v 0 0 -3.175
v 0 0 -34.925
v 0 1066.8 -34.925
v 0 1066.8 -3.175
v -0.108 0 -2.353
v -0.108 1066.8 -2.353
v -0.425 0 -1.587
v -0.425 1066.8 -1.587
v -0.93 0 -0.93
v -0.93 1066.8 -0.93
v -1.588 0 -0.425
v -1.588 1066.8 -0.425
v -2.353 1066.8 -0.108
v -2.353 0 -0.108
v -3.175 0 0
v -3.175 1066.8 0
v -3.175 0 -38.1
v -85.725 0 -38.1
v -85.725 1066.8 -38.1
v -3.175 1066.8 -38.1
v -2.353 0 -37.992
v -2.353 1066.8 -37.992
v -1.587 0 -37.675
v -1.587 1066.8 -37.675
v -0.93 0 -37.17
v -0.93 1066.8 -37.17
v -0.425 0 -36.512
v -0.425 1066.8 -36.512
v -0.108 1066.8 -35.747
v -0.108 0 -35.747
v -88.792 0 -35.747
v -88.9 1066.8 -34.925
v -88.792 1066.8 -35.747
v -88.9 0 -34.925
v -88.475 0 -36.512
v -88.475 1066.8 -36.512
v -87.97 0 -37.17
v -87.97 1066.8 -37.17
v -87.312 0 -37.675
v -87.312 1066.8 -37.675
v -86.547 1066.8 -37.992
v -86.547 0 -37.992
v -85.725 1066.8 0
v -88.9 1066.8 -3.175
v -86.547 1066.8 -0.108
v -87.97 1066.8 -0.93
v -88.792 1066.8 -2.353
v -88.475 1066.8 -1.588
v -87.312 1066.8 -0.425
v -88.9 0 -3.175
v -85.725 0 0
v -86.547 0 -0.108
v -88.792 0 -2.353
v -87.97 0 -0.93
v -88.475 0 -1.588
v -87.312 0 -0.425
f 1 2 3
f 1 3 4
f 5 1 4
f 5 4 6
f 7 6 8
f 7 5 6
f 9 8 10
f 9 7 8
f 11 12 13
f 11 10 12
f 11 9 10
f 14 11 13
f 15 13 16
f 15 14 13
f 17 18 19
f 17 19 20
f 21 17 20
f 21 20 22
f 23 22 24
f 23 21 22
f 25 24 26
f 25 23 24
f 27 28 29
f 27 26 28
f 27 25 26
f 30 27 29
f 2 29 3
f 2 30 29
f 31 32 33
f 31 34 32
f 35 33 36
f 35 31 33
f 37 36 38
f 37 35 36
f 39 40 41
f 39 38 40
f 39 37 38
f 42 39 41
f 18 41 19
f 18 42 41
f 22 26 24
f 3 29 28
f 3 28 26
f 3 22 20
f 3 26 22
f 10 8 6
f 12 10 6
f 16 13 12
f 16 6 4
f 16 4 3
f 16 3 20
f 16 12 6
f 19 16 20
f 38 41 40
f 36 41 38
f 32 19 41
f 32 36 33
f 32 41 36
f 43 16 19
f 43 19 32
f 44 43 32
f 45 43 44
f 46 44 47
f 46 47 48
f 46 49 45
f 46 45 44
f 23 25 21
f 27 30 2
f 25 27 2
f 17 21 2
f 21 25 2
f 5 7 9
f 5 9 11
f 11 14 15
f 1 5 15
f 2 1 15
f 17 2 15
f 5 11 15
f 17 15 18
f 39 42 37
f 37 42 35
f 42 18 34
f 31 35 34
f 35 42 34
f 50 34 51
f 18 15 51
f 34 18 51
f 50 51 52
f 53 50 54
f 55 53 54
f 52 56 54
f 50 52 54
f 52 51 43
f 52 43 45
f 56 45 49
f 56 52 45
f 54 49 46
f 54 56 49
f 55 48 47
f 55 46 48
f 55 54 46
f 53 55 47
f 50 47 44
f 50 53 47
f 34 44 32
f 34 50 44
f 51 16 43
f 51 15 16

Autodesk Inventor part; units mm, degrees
ref_plane "YZ Plane" through (0, 0, 0) normal (1, 0, 0) x (0, 1, 0)
ref_plane "XZ Plane" through (0, 0, 0) normal (0, 1, 0) x (-1, 0, 0)
ref_plane "XY Plane" through (0, 0, 0) normal (0, 0, 1) x (1, 0, 0)
sketch "Sketch1" plane through (0, 0, 0) normal (0, 1, 0) x (-1, 0, 0)
  line L0 (3.175, 0) -> (85.725, 0)
  line L1 (88.9, -3.175) -> (88.9, -34.925)
  line L2 (85.725, -38.1) -> (3.175, -38.1)
  line L3 (0, -34.925) -> (0, -3.175)
  arc A0 (88.9, -3.175) -> (85.725, 0) centre (85.725, -3.175) ccw
  arc A1 (85.725, -38.1) -> (88.9, -34.925) centre (85.725, -34.925) ccw
  arc A2 (0, -34.925) -> (3.175, -38.1) centre (3.175, -34.925) ccw
  arc A3 (3.175, 0) -> (0, -3.175) centre (3.175, -3.175) ccw
  point P0 (0, 0)
  point P1 (88.9, -38.1)
  point P2 (88.9, 0)
  point P3 (0, -38.1)
  dimension "d0" = 88.9
  dimension "d1" = 38.1
  dimension "d2" = 3.175
extrude "Extrusion1" add sketch "Sketch1" along normal blind 1066.8
sketch "Sketch2" plane through (-3.175, 0, -38.1) normal (0, 0, -1) x (-1, 0, 0)
  line L0 (0, 0) -> (82.55, 0) construction
  line L1 (82.55, 0) -> (82.55, 1066.8) construction
  line L2 (0, 1066.8) -> (82.55, 1066.8) construction
  line L3 (0, 0) -> (0, 1066.8) construction
  line L4 (60.325, 1066.8) -> (60.325, 800.1) construction
  line L5 (60.325, 800.1) -> (60.325, 533.4) construction
  line L6 (60.325, 533.4) -> (60.325, 266.7) construction
  line L7 (60.325, 266.7) -> (60.325, 0) construction
  circle A0 centre (60.325, 826.3001) radius 1.5875
  circle A1 centre (60.325, 773.8999) radius 1.5875
  circle A2 centre (60.325, 559.6001) radius 1.5875
  circle A3 centre (60.325, 507.1999) radius 1.5875
  circle A4 centre (60.325, 292.9001) radius 1.5875
  circle A5 centre (60.325, 240.4999) radius 1.5875
  line L8 (85.725, 0) -> (85.725, 1066.8) projected
  line L9 (60.325, 800.1) -> (22.225, 800.1) construction
  circle A6 centre (22.225, 800.1) radius 1.5875
  line L10 (60.325, 533.4) -> (22.225, 533.4) construction
  circle A7 centre (22.225, 533.4) radius 1.5875
  line L11 (60.325, 266.7) -> (22.225, 266.7) construction
  circle A8 centre (22.225, 266.7) radius 1.5875
  point P0 (-3.175, 0)
  point P1 (85.725, 533.4)
  dimension "d5" = 3.175
  dimension "d6" = 26.2001
  dimension "d7" = 26.2001
  dimension "d8" = 3.175
  dimension "d9" = 26.2001
  dimension "d10" = 26.2001
  dimension "d11" = 3.175
  dimension "d12" = 26.2001
  dimension "d13" = 26.2001
  dimension "d16" = 25.4
  dimension "d17" = 38.1
  dimension "d18" = 38.1
  dimension "d19" = 38.1
extrude "Extrusion2" [suppressed]
equation "\"d7\" = d6"
equation "\"d10\" = d9"
equation "\"d13\" = d12"
properties part number "Vertical Beam 4ft" material "Wood (Birch)"
